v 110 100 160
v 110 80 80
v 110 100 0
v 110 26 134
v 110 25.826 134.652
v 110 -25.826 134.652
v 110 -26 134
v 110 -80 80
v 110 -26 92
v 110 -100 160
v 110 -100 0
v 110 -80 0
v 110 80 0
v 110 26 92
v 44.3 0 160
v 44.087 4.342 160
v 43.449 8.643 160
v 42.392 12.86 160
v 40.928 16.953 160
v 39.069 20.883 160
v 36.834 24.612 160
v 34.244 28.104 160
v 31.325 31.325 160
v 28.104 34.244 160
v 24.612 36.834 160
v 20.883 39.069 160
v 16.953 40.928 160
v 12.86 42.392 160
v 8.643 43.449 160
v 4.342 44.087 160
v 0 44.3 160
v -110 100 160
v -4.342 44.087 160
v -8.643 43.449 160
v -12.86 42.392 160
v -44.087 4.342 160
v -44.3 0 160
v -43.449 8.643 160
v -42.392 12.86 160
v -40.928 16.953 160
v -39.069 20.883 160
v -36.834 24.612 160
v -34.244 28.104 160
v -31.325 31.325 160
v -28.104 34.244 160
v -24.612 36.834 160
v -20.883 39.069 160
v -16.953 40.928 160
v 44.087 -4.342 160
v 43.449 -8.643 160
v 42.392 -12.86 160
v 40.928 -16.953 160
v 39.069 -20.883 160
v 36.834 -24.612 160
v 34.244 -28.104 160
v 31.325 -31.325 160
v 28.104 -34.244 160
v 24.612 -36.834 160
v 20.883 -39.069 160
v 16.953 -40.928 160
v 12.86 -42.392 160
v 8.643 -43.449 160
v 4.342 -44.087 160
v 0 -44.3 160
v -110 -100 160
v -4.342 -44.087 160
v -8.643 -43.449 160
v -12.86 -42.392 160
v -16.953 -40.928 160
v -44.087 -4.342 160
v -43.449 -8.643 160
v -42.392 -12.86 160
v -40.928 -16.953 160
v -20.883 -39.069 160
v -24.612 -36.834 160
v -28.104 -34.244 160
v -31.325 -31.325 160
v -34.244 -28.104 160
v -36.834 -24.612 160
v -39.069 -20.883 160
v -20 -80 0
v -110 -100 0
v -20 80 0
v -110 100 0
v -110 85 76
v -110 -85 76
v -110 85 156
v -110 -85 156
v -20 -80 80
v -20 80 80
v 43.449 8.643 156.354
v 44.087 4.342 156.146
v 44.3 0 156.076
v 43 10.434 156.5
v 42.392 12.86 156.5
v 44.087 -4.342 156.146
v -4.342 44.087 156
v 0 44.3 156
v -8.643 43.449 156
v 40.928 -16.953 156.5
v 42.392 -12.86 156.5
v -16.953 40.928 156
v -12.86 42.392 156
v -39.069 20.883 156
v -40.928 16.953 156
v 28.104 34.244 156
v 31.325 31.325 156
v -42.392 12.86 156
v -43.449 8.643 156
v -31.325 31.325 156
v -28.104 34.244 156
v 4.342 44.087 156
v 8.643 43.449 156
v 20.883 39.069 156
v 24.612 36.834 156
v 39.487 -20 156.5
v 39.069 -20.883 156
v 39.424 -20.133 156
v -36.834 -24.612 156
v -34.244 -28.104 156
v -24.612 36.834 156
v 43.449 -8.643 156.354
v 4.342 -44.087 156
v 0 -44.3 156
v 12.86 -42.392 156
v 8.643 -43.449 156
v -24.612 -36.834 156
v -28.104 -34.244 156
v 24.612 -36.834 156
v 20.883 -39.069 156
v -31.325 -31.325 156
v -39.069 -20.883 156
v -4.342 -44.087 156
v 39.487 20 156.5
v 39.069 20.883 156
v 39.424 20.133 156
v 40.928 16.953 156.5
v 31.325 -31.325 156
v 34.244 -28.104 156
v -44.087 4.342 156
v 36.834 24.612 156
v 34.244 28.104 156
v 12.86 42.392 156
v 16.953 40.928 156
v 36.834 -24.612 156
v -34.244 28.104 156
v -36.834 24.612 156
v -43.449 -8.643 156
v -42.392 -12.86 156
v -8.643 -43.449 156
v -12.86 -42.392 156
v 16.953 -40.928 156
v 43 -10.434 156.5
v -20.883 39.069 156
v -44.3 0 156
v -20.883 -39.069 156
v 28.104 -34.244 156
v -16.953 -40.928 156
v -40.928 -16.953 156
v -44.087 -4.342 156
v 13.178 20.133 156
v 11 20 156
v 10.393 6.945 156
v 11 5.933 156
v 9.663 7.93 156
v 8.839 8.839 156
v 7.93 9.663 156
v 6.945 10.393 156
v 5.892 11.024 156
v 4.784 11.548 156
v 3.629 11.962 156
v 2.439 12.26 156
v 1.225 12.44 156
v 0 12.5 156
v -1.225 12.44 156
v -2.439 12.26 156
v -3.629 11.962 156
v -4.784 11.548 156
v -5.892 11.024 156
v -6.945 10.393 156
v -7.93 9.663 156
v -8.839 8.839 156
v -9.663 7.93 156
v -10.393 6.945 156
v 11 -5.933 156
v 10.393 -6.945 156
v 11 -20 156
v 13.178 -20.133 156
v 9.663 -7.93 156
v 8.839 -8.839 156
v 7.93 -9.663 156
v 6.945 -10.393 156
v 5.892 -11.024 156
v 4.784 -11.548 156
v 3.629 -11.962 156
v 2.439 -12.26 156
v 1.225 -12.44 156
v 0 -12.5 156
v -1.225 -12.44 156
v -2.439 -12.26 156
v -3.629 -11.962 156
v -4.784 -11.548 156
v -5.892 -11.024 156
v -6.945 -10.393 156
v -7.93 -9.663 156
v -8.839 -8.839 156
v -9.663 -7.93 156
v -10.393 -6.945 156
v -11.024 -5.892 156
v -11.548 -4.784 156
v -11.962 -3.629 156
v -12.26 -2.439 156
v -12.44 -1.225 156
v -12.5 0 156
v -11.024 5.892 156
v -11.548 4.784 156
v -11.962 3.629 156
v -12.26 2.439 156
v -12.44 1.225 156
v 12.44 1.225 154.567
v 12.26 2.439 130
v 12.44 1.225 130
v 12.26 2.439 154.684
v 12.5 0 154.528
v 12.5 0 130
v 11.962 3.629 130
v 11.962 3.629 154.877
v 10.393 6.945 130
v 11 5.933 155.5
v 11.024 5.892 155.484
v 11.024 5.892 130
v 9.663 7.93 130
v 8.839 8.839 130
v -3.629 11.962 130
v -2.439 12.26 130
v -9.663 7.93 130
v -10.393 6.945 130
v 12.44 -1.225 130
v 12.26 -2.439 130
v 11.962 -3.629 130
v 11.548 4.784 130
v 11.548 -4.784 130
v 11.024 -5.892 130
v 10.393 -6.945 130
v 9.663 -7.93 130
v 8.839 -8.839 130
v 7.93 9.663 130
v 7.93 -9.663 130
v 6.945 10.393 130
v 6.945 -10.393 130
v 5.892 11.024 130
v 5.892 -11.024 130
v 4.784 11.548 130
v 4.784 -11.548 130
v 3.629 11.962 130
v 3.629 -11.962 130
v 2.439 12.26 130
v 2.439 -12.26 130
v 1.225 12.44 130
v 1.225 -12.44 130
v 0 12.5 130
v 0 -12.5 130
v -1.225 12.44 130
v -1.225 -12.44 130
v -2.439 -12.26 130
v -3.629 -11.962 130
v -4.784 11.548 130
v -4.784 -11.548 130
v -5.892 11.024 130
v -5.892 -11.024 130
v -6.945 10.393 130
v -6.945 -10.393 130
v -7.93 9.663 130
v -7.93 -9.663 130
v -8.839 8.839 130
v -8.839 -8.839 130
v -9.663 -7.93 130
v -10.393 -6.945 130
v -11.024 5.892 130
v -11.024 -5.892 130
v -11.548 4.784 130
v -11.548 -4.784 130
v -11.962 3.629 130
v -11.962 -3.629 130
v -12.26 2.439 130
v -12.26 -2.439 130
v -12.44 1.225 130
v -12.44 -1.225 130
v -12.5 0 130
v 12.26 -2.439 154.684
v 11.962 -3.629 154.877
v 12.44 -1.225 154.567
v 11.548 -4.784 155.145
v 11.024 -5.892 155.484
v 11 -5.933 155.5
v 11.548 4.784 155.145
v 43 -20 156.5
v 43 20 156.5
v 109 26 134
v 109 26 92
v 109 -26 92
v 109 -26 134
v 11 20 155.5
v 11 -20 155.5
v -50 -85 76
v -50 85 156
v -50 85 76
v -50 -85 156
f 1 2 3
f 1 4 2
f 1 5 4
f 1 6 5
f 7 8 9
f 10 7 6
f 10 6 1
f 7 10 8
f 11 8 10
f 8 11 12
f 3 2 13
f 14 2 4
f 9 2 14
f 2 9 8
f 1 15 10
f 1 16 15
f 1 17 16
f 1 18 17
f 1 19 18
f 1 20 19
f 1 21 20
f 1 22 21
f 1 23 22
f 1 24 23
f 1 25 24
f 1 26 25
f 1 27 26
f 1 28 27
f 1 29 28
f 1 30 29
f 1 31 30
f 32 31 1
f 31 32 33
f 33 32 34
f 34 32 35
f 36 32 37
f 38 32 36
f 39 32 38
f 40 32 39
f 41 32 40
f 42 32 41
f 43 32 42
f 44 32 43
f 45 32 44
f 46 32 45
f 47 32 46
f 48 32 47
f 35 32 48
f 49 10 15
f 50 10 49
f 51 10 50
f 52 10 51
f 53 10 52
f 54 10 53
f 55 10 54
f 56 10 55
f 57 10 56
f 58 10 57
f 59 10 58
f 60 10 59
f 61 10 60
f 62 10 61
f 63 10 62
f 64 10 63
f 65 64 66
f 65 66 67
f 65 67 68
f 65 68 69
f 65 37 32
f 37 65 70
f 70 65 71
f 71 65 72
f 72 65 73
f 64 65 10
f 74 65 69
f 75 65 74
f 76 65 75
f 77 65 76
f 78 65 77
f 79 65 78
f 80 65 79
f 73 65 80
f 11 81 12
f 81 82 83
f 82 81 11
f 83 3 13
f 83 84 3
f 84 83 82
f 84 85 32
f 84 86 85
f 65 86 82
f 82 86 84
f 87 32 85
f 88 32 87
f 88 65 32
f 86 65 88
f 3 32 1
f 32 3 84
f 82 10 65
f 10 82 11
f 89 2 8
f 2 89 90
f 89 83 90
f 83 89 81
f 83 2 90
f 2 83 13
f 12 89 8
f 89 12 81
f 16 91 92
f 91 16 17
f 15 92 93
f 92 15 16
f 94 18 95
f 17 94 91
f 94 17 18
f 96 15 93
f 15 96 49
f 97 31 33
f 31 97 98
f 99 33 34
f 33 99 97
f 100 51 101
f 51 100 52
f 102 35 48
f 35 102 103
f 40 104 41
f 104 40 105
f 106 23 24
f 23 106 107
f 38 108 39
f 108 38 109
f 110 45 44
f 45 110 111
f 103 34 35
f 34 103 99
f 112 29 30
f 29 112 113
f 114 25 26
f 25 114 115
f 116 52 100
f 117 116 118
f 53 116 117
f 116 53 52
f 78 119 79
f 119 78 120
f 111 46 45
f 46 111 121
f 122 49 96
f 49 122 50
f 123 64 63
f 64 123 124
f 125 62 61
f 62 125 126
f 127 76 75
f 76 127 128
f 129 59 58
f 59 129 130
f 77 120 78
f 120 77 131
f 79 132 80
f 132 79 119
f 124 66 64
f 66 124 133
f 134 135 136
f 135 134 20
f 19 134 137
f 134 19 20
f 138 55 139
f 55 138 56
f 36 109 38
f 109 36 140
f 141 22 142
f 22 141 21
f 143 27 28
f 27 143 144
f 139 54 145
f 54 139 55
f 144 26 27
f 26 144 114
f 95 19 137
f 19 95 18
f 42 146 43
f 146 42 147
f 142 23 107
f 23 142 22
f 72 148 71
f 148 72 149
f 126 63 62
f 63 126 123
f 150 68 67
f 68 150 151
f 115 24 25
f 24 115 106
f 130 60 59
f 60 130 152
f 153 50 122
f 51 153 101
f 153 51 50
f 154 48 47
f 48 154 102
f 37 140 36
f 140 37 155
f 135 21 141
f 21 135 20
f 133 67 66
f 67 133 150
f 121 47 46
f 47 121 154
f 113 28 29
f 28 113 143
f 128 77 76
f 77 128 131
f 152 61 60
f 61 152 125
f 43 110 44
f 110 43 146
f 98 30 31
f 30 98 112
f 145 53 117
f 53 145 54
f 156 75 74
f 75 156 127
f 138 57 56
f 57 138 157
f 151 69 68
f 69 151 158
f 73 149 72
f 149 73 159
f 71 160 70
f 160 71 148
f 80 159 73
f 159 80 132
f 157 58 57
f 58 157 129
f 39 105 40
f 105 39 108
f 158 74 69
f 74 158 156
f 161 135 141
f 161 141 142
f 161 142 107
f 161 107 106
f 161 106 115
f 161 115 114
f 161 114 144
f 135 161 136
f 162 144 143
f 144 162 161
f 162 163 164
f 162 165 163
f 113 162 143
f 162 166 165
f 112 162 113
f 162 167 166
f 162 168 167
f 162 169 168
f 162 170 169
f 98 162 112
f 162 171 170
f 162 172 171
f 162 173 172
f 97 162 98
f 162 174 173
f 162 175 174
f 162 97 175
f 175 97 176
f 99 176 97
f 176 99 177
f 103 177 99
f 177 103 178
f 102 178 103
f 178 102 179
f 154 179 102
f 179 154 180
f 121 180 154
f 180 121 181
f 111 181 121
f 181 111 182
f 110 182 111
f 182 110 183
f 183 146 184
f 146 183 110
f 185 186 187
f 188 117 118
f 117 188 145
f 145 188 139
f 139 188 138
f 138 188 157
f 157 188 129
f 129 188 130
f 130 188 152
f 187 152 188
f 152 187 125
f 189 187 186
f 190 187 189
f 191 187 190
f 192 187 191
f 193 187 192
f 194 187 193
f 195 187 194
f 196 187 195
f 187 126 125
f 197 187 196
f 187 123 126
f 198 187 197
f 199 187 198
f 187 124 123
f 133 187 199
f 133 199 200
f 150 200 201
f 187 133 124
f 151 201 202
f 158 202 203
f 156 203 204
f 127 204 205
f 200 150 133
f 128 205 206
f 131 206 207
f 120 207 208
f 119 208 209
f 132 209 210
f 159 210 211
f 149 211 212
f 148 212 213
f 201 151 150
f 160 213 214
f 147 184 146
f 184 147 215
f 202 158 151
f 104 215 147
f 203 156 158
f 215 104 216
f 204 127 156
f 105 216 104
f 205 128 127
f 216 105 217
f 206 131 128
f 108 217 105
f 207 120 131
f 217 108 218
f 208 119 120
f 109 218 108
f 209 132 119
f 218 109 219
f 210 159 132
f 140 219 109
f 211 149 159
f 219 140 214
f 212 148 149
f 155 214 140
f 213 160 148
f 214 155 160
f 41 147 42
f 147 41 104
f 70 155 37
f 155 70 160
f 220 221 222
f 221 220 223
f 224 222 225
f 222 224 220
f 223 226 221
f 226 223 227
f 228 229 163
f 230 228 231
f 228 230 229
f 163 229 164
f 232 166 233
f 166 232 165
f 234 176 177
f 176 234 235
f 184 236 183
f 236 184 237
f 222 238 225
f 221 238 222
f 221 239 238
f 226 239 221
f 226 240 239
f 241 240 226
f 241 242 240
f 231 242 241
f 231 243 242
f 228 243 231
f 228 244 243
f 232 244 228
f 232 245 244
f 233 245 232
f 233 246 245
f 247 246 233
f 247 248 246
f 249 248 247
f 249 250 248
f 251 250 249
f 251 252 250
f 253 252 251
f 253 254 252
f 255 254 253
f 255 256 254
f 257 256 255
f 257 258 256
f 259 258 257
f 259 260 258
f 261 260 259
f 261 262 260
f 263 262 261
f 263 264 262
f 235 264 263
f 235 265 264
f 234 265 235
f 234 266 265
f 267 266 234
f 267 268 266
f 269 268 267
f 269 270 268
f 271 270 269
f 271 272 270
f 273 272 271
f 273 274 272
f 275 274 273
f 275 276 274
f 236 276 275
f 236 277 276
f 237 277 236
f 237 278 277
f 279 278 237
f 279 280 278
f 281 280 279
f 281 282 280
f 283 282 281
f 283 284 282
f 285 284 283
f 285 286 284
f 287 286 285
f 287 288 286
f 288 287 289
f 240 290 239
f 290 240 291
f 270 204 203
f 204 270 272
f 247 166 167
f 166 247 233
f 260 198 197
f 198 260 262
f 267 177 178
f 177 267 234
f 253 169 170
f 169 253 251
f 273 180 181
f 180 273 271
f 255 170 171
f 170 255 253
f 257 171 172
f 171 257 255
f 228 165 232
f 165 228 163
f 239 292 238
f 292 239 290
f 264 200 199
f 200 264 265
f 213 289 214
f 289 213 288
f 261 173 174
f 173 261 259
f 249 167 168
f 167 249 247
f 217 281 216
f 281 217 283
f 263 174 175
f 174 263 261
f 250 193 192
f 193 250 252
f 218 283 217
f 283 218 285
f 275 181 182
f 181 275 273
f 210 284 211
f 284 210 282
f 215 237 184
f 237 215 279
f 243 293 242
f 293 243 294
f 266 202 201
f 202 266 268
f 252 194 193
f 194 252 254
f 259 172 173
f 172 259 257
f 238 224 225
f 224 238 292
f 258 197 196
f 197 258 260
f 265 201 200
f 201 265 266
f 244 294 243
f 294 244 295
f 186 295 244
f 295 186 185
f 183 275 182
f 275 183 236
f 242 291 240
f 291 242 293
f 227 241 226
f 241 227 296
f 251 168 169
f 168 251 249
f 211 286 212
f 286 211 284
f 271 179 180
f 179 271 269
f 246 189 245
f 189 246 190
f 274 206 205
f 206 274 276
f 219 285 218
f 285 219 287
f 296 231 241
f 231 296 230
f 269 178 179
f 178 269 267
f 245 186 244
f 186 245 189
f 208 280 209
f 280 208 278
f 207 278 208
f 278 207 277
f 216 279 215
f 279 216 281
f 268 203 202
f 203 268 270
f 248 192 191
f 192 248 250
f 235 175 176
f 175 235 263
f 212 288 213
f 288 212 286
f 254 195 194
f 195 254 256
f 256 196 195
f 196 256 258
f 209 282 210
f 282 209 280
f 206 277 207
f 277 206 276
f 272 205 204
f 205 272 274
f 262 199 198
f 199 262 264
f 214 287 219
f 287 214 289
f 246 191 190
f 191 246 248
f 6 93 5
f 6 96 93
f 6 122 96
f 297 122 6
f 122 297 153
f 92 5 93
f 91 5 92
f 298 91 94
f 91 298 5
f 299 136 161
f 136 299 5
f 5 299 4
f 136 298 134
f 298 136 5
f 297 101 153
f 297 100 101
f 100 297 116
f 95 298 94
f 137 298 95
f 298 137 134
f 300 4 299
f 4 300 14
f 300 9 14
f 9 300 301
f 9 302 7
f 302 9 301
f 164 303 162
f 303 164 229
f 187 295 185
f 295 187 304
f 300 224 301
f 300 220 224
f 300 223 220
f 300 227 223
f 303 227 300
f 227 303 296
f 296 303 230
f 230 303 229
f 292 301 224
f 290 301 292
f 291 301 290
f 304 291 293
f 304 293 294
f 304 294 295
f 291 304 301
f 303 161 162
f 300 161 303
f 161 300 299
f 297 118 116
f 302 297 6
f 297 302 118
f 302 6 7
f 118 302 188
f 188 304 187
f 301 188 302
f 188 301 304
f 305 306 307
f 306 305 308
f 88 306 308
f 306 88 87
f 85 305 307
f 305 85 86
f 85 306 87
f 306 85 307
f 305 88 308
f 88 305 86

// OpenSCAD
// AiPetFeeder — Lower body chassis (C-shape, with internal chute)
// ---------------------------------------------------------------------------
// First iteration of the integrated feeder body. C-shape architecture:
//   • Top:     circular recess that seats the rotary-disc housing
//   • Inside:  internal slanted CHUTE that catches kibble from the
//              housing floor outlet (+X side) and routes it to a front
//              exit window above the bowl
//   • Front:   BOWL NICHE — a 130 × 160 × 80 mm pocket the bowl slides into
//   • Back/floor: ELECTRONICS BAY — large hollow region for motor + ESP32 +
//              driver + HX711 + DC jack (cutouts in panels in next iter)
//
// Coordinate convention:
//   +X = FRONT (toward bowl), -X = BACK (electronics access panel)
//   +Y / -Y = left / right (symmetric)
//   +Z = UP
//   Chassis bottom face at z = 0
//
// CRITICAL: this design assumes the rotary-disc housing is configured with
// outlet_angle_deg = 0 (outlet faces +X = front) and inlet_angle_deg = 180
// (hopper above sits offset to the back). The paddle_wheel_module.scad was
// updated in the same commit.
//
// Parts:
//   part = "chassis"  -> the body alone
//   part = "assembly" -> chassis + rotary housing + cap + wheel + funnel
//                        + storage ring + lid, all stacked
// ===========================================================================

use <paddle_wheel_module.scad>
use <bulk_hopper_module.scad>

part = "chassis";   // chassis | assembly

/* [Chassis envelope] */
// 2026-06-03: back to 220 (Ø80 mechanism). The Ø160 hopper now centers at
// x=-29 (smaller hole_mid_r), so it fits within 220 again.
chassis_d   = 220;   // depth (X dimension, front-to-back)
chassis_w   = 200;   // width (Y dimension, side-to-side)
chassis_h   = 160;   // height (Z dimension)

/* [Bowl niche] (carved from FRONT face) */
bowl_niche_d = 130;  // depth into chassis (along X from front face)
bowl_niche_w = 160;  // width (Y)
bowl_niche_h = 80;   // height (Z, from bottom of chassis)

/* [Rotary-disc housing seat] (carved into TOP face, centered) */
// Recess that locates the housing — housing OD slips into it.
// 2026-06-03: back to Ø87.6 with wheel_d=80.
housing_outer_d  = 87.6;  // = 2 × hr_out in paddle_wheel_module.scad
housing_height   = 37;    // = housing_h in paddle_wheel_module.scad
                          //   (end_wall 3 + floor_clear 0.5 + wheel_thickness
                          //    18 + wheel_axial_clear 0.5 + housing_buffer_h 15)
recess_clear     = 0.5;
recess_depth     = 4;

/* [Internal chute] (catches kibble from housing outlet -> front exit) */
// The housing outlet is at (+X-relative-to-housing-center, y=0) at radial
// distance hole_mid_r ≈ 27 mm. Inlet of the chute is directly below.
// 2026-06-05: chute follows the enlarged 26×34 hole (Ø80 wheel).
chute_inlet_w_x  = 32;    // radial extent (= hole_len 26 + 6 catch margin)
chute_inlet_w_y  = 40;    // tangential extent (= hole_w 34 + 6 catch margin)
chute_outlet_w_y = 52;    // chute mouth width at the front exit
chute_outlet_w_z = 42;    // chute mouth height at the front exit
chute_outlet_top_above_bowl = 12;  // gap above bowl niche top for the chute mouth

/* [Electronics bay opening] (carved from BACK face) — outline only this iter */
el_bay_d = 60;       // depth into chassis from back face (X)
el_bay_w = 170;      // width (Y)
el_bay_h = 80;       // height (Z, from chassis bottom up to the chute level)

/* [Quality] */
$fn = 64;

// --- derived ----------------------------------------------------------------
// Housing outlet position in chassis frame (housing center = chassis (0,0,top))
housing_outlet_x = 27;   // ≈ hole_mid_r = (hole_radial_in+hole_radial_out)/2 = (14+40)/2
housing_outlet_z = chassis_h;  // kibble enters chassis from above at top

// Chute outlet position (front face)
chute_outlet_z_center = bowl_niche_h + chute_outlet_top_above_bowl
                       + chute_outlet_w_z / 2;

// ===========================================================================
// CHASSIS
// ===========================================================================
module chassis() {
    difference() {
        // Outer body — solid rectangular block (sharp edges; chamfers later)
        translate([-chassis_d / 2, -chassis_w / 2, 0])
            cube([chassis_d, chassis_w, chassis_h]);

        // ---- Bowl niche (carved from +X / front face) ----
        translate([chassis_d / 2 - bowl_niche_d,
                   -bowl_niche_w / 2,
                   0])
            cube([bowl_niche_d + 1, bowl_niche_w, bowl_niche_h]);

        // ---- Top recess for rotary housing (centered) ----
        translate([0, 0, chassis_h - recess_depth])
            cylinder(h = recess_depth + 1,
                     d = housing_outer_d + 2 * recess_clear);

        // ---- Vertical hole through chassis top for housing axle/bottom ----
        // (Provides clearance for motor coupler going UP into housing axle stub)
        translate([0, 0, chassis_h - 30])
            cylinder(h = 30 + 1, d = 25);

        // ---- Internal chute (slanted tunnel: housing outlet → front mouth) ----
        // Hulled cavity between two thin slabs: top slab at housing outlet
        // position; bottom slab at front face above bowl niche.
        hull() {
            // Top inlet slab (at the housing outlet position)
            translate([housing_outlet_x - chute_inlet_w_x / 2,
                       -chute_inlet_w_y / 2,
                       chassis_h - recess_depth - 0.5])
                cube([chute_inlet_w_x, chute_inlet_w_y, 1]);
            // Front outlet slab (at chassis front face, above bowl niche)
            translate([chassis_d / 2 - 1,
                       -chute_outlet_w_y / 2,
                       chute_outlet_z_center - chute_outlet_w_z / 2])
                cube([3, chute_outlet_w_y, chute_outlet_w_z]);
        }

        // ---- Electronics bay (carved from -X / back face) ----
        translate([-chassis_d / 2 - 1,
                   -el_bay_w / 2,
                   chassis_h - 4 - el_bay_h])
            cube([el_bay_d + 1, el_bay_w, el_bay_h]);
    }
}

// ===========================================================================
// ASSEMBLY  full feeder visual: chassis + rotary + hopper stack
// ===========================================================================
module assembly() {
    // Chassis
    color("LightGray") chassis();

    // Rotary-disc housing on top of chassis (in the recess)
    z_housing_bottom = chassis_h - recess_depth;
    translate([0, 0, z_housing_bottom])
        color("LightBlue", 0.75) housing();

    // Wheel inside the housing
    // (paddle_wheel_module.scad's wheel sits at end_wall + floor_clear in housing-local frame)
    translate([0, 0, z_housing_bottom + 3.5])
        color("Silver") wheel();

    // Axle through the wheel (extends below to chassis + above through cap)
    translate([0, 0, z_housing_bottom - 22])
        color("DimGray") axle();

    // End cap on top of housing rim
    translate([0, 0, z_housing_bottom + housing_height])
        color("LightSteelBlue", 0.75) end_cap();

    // Bulk hopper: funnel sits ON the cap (collar-mount; no socket).
    // Funnel bottom is offset to (-hole_mid_r, 0) so its rect bottom
    // aligns with the cap inlet hole. The cap collar surrounds the
    // funnel outer bottom edge.
    z_cap_top = z_housing_bottom + housing_height + 3 /*end_wall*/;
    translate([-27, 0,z_cap_top])
        color("LightBlue", 0.5) funnel();

    // Storage ring on top of funnel (funnel_h = 115 mm in new design)
    z_funnel_top = z_cap_top + 115;
    translate([-27, 0,z_funnel_top])
        color("LightSteelBlue", 0.5) ring();

    // Lid on top of ring (ring_h = 170 mm)
    z_ring_top = z_funnel_top + 170;
    translate([-27, 0,z_ring_top])
        color("Khaki", 0.6) lid();
}

// ===========================================================================
// RENDER
// ===========================================================================
if (part == "chassis")  chassis();
if (part == "assembly") assembly();

echo(str("chassis ", chassis_d, "x", chassis_w, "x", chassis_h,
         " bowl_niche ", bowl_niche_d, "x", bowl_niche_w, "x", bowl_niche_h,
         " chute_outlet_z=", chute_outlet_z_center,
         " total_tower_z=", chassis_h + housing_height + 3 + 12 + 153 + 170 + 24));
